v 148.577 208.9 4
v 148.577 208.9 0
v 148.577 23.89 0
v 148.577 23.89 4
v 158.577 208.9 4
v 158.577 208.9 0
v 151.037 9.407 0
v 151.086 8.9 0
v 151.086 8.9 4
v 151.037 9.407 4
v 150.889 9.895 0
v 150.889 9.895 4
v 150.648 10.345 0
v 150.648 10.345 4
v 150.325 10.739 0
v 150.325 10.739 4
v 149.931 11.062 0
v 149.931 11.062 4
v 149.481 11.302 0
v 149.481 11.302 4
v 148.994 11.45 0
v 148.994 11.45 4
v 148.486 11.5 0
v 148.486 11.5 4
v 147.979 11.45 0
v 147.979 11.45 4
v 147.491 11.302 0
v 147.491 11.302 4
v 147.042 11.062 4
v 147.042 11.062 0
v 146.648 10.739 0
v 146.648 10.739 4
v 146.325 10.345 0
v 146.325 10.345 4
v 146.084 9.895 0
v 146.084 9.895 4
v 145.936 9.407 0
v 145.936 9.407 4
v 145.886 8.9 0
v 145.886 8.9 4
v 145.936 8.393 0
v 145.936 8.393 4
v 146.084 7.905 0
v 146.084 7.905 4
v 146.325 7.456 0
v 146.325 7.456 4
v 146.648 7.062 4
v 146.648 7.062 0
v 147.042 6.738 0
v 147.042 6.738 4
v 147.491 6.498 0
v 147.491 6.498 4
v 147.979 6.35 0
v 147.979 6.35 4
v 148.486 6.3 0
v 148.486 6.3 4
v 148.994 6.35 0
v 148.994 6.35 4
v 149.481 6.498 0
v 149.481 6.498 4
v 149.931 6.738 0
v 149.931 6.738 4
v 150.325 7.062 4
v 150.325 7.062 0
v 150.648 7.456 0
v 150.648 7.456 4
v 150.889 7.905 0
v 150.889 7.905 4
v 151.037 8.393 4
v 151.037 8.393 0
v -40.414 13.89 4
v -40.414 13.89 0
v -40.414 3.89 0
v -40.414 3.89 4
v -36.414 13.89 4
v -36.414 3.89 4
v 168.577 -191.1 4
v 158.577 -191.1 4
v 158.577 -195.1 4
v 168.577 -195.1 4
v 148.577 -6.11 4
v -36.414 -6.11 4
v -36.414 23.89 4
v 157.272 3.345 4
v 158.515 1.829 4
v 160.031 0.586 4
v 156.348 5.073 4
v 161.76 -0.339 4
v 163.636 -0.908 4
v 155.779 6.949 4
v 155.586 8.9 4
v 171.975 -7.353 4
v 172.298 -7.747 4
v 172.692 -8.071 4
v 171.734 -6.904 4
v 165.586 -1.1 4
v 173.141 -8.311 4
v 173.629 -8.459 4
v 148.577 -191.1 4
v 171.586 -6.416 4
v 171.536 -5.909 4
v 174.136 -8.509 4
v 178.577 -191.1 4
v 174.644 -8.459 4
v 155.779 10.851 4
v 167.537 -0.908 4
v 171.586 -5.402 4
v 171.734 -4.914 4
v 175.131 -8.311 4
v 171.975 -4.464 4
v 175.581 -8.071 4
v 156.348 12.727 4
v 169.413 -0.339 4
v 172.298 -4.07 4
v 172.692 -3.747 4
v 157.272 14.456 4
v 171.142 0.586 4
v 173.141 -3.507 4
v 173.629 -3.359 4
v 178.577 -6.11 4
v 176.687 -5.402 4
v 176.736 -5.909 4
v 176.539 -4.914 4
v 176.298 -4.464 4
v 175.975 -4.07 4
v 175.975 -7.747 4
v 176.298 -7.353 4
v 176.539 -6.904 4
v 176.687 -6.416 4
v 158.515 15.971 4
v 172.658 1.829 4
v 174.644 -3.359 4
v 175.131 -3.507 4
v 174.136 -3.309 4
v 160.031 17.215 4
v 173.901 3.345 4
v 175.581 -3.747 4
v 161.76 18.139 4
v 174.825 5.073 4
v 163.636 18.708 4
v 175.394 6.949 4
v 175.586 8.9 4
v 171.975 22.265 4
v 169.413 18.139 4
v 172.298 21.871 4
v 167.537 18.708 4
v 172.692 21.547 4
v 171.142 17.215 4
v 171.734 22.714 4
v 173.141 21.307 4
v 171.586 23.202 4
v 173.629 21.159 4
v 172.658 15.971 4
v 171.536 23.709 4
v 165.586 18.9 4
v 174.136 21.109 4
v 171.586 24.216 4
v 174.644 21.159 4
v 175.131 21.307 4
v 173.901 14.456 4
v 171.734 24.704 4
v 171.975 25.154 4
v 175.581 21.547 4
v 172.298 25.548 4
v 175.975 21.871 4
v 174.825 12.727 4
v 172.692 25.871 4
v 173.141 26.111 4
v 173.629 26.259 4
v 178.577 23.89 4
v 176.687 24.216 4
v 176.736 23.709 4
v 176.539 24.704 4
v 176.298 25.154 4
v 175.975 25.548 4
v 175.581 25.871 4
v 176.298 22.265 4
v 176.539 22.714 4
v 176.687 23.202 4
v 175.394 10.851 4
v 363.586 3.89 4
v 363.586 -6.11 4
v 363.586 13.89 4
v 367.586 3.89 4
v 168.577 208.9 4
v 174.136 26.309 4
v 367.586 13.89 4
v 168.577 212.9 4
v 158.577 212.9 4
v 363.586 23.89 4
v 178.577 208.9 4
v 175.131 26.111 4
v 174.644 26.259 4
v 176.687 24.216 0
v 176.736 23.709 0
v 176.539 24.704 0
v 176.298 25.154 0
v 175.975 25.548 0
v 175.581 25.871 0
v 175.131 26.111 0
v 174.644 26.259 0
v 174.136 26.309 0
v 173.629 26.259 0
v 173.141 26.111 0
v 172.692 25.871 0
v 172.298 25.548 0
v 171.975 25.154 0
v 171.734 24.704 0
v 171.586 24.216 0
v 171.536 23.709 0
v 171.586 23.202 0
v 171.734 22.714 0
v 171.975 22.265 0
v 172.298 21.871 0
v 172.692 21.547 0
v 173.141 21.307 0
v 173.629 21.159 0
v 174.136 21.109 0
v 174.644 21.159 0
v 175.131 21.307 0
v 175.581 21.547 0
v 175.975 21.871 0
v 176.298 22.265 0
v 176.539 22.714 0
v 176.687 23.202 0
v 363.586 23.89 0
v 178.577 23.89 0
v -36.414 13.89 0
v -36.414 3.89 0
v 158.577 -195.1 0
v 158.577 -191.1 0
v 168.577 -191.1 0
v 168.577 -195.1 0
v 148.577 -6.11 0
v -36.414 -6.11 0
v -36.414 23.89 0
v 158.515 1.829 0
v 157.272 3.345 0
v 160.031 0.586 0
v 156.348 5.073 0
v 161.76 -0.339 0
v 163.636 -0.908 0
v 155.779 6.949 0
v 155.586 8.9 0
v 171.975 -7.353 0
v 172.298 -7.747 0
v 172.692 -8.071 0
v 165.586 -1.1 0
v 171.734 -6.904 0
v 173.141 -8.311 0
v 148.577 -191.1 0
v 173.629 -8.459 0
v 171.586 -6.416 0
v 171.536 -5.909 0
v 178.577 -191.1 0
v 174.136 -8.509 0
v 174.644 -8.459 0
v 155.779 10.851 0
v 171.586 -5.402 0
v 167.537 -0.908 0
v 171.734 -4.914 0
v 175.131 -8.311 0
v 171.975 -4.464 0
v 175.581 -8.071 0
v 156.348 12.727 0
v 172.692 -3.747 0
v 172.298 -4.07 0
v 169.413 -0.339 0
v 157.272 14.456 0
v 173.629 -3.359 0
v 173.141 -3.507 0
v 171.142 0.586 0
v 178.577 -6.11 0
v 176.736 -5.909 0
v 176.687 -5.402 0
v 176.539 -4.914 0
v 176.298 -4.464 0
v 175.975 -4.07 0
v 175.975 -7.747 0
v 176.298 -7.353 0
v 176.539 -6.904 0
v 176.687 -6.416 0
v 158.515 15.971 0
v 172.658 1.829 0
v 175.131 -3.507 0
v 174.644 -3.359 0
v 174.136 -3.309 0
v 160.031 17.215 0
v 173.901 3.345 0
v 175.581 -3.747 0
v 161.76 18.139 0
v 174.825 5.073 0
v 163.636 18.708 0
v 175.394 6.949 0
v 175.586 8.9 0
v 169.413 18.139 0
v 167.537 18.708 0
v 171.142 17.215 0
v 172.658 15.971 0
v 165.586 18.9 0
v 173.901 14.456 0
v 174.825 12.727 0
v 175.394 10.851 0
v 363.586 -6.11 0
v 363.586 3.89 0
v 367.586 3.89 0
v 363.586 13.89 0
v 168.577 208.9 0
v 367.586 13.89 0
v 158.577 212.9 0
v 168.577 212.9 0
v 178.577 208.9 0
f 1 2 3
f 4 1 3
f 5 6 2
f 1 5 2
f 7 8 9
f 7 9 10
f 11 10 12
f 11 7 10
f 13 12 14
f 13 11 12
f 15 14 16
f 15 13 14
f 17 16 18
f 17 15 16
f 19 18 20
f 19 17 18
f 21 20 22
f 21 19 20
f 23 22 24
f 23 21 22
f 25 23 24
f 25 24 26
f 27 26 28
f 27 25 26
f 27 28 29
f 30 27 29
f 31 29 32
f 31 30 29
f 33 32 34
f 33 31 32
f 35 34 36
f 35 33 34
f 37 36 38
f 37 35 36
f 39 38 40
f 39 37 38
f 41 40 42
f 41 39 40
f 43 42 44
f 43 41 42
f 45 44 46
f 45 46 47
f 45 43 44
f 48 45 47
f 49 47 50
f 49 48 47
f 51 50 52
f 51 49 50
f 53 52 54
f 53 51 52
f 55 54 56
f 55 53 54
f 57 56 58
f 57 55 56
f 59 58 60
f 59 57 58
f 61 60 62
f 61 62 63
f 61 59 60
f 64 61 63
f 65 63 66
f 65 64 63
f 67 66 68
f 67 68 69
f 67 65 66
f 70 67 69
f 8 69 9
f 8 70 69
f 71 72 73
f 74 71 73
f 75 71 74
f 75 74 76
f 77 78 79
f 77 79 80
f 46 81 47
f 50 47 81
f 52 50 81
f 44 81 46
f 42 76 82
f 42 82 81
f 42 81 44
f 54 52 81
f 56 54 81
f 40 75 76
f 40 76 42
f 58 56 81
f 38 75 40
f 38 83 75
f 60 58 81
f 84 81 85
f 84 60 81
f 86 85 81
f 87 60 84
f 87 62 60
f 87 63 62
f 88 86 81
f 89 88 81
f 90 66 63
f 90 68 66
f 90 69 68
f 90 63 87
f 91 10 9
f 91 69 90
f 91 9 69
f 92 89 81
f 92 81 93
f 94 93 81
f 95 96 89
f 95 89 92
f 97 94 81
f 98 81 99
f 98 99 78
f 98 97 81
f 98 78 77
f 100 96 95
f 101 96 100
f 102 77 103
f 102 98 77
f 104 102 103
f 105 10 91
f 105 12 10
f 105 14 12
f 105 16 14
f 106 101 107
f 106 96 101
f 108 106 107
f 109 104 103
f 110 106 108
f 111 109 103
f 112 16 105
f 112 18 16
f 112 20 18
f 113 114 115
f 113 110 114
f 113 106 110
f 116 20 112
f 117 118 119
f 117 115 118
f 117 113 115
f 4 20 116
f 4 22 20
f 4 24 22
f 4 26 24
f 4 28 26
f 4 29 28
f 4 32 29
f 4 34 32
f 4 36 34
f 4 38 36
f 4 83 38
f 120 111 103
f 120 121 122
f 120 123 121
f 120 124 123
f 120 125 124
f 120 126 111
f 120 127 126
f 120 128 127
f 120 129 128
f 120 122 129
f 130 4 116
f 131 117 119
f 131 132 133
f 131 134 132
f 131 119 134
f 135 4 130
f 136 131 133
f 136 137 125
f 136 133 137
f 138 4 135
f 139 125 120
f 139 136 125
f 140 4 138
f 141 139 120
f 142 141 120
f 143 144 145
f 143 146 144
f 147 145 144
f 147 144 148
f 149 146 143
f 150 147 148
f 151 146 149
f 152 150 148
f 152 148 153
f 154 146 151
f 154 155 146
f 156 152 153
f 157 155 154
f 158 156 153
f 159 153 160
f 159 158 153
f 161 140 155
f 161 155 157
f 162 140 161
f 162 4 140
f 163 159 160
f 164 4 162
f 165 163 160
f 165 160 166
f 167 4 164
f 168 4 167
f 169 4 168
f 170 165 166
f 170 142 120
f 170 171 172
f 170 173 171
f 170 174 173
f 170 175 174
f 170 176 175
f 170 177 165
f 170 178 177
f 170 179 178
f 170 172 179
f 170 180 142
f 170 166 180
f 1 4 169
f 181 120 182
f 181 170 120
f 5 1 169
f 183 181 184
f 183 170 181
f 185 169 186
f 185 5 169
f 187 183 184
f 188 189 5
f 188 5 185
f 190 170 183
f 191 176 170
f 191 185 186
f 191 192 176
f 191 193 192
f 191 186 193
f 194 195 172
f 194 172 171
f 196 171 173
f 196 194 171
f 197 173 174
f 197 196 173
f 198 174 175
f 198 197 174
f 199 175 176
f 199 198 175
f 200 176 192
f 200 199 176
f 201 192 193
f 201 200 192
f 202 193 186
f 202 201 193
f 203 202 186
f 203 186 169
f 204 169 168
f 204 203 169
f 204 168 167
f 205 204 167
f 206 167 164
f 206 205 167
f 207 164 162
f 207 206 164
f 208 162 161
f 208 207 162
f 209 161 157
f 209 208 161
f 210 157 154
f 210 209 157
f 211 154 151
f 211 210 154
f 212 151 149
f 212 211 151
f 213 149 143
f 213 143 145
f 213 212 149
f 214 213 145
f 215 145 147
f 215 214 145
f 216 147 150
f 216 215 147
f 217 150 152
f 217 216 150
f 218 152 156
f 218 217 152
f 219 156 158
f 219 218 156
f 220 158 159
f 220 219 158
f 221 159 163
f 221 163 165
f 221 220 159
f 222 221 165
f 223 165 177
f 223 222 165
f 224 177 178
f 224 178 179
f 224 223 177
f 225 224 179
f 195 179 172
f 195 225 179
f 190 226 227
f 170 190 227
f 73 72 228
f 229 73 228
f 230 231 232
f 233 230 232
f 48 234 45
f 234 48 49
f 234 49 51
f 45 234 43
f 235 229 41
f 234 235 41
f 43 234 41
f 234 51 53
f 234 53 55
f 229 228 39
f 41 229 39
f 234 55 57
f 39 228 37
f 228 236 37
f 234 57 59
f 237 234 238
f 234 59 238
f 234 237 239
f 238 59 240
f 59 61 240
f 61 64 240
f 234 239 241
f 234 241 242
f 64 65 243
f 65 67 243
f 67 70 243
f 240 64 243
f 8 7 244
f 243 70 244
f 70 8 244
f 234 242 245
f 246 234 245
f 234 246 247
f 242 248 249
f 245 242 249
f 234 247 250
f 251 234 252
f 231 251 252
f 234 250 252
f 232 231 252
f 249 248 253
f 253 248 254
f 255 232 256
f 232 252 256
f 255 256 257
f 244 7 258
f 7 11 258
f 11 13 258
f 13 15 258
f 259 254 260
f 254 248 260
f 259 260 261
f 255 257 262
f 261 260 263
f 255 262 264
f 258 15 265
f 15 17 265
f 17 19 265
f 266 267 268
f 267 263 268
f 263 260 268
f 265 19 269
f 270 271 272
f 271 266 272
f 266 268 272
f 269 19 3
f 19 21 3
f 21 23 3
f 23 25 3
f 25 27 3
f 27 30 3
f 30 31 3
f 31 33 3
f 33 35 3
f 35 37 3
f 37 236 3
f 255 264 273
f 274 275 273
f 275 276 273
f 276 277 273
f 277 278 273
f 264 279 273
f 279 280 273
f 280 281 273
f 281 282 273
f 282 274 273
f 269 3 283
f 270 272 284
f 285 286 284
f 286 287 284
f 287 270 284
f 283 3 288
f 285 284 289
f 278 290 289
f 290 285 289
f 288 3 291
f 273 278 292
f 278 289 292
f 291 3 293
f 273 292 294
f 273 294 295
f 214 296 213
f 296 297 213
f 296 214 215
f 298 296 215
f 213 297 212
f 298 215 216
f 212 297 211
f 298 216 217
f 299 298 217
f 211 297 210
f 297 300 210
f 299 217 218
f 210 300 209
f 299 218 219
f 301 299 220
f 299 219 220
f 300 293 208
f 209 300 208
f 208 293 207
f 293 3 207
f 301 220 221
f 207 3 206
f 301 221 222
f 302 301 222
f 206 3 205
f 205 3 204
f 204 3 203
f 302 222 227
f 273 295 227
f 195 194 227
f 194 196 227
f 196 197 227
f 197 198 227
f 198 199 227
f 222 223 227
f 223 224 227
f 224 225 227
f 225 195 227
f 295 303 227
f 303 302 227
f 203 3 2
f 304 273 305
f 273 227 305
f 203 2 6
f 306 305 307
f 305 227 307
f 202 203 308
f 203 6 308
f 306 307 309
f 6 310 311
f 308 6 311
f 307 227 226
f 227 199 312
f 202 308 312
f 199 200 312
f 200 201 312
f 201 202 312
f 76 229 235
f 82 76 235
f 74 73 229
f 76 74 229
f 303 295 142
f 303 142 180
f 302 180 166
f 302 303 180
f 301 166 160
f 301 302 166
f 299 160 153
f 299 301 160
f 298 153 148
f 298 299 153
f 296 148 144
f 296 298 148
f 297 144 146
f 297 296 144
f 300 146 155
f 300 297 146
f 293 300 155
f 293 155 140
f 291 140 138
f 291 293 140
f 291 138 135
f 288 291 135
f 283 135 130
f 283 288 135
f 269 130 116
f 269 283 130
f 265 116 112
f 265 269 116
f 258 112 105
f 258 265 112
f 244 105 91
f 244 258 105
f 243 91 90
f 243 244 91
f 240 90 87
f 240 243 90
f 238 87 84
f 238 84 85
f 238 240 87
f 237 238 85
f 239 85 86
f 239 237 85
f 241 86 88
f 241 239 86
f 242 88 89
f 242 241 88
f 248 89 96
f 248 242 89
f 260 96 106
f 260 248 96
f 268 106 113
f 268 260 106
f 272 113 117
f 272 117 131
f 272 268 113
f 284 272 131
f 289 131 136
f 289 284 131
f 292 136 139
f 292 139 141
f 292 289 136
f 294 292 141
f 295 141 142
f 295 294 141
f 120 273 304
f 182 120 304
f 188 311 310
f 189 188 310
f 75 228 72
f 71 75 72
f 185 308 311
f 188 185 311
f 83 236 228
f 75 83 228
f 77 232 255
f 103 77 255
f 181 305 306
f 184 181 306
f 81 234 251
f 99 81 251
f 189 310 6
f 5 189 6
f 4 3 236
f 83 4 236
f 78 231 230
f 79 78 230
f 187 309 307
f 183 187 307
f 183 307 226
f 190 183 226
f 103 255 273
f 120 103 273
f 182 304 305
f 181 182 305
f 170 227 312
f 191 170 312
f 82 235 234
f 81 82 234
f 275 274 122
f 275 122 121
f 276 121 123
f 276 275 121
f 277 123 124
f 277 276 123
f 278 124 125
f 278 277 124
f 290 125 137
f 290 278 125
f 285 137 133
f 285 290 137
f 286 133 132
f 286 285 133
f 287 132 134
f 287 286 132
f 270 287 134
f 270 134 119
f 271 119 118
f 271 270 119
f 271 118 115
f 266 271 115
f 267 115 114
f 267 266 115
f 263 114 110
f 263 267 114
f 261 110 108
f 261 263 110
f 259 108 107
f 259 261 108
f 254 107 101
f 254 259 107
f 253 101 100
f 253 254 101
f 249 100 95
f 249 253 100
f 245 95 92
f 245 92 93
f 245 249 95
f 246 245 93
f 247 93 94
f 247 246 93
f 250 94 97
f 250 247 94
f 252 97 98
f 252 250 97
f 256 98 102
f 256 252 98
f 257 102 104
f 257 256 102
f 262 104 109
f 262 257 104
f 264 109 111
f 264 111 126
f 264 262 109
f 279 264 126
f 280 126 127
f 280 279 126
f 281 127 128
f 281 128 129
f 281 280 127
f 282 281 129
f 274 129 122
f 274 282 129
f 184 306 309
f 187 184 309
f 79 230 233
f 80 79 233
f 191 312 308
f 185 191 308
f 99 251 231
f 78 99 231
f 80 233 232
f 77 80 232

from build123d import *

# Parameters (mm, degrees)
BOSS_EXTRUDE1_DEPTH = 4
CAVITY1_OUTLINE_R   = 2.6
CAVITY1_OUTLINE_R_2 = 10
CAVITY1_DEPTH       = 4


# Read off the part's stored shape, not the designer's step: Cavity1
with BuildPart() as part:
    # Sketch1 → Boss-Extrude1 (new body)
    with BuildSketch(Plane.XY):
        Polygon((363.586470787, 3.889663418), (367.586470787, 3.889663418), (367.586470787, 13.889663418), (363.586470787, 13.889663418), (363.586470787, 23.889663418), (178.577070849, 23.889663418), (178.577070849, 208.900229456), (168.577070849, 208.900229456), (168.577070849, 212.900229456), (158.577070849, 212.900229456), (158.577070849, 208.900229456), (148.577070849, 208.900229456), (148.577070849, 23.889663418), (-36.413529213, 23.889663418), (-36.413529213, 13.889663418), (-40.413529213, 13.889663418), (-40.413529213, 3.889663418), (-36.413529213, 3.889663418), (-36.413529213, -6.110336582), (148.577070849, -6.110336582), (148.577070849, -191.099770544), (158.577070849, -191.099770544), (158.577070849, -195.099770544), (168.577070849, -195.099770544), (168.577070849, -191.099770544), (178.577070849, -191.099770544), (178.577070849, -6.110336582), (363.586470787, -6.110336582), align=None)
    extrude(amount=BOSS_EXTRUDE1_DEPTH)

    # Cavity1 outline → Cavity1 (cut)
    with BuildSketch(Plane.XY):
        with Locations((174.136470787, 23.709263861)):
            Circle(CAVITY1_OUTLINE_R)
        with Locations((174.136470787, -5.908804949)):
            Circle(CAVITY1_OUTLINE_R)
        with Locations((148.486470787, 8.900229456)):
            Circle(CAVITY1_OUTLINE_R)
        with Locations((165.586470787, 8.900229456)):
            Circle(CAVITY1_OUTLINE_R_2)
    extrude(amount=CAVITY1_DEPTH, mode=Mode.SUBTRACT)


solid = part.part
